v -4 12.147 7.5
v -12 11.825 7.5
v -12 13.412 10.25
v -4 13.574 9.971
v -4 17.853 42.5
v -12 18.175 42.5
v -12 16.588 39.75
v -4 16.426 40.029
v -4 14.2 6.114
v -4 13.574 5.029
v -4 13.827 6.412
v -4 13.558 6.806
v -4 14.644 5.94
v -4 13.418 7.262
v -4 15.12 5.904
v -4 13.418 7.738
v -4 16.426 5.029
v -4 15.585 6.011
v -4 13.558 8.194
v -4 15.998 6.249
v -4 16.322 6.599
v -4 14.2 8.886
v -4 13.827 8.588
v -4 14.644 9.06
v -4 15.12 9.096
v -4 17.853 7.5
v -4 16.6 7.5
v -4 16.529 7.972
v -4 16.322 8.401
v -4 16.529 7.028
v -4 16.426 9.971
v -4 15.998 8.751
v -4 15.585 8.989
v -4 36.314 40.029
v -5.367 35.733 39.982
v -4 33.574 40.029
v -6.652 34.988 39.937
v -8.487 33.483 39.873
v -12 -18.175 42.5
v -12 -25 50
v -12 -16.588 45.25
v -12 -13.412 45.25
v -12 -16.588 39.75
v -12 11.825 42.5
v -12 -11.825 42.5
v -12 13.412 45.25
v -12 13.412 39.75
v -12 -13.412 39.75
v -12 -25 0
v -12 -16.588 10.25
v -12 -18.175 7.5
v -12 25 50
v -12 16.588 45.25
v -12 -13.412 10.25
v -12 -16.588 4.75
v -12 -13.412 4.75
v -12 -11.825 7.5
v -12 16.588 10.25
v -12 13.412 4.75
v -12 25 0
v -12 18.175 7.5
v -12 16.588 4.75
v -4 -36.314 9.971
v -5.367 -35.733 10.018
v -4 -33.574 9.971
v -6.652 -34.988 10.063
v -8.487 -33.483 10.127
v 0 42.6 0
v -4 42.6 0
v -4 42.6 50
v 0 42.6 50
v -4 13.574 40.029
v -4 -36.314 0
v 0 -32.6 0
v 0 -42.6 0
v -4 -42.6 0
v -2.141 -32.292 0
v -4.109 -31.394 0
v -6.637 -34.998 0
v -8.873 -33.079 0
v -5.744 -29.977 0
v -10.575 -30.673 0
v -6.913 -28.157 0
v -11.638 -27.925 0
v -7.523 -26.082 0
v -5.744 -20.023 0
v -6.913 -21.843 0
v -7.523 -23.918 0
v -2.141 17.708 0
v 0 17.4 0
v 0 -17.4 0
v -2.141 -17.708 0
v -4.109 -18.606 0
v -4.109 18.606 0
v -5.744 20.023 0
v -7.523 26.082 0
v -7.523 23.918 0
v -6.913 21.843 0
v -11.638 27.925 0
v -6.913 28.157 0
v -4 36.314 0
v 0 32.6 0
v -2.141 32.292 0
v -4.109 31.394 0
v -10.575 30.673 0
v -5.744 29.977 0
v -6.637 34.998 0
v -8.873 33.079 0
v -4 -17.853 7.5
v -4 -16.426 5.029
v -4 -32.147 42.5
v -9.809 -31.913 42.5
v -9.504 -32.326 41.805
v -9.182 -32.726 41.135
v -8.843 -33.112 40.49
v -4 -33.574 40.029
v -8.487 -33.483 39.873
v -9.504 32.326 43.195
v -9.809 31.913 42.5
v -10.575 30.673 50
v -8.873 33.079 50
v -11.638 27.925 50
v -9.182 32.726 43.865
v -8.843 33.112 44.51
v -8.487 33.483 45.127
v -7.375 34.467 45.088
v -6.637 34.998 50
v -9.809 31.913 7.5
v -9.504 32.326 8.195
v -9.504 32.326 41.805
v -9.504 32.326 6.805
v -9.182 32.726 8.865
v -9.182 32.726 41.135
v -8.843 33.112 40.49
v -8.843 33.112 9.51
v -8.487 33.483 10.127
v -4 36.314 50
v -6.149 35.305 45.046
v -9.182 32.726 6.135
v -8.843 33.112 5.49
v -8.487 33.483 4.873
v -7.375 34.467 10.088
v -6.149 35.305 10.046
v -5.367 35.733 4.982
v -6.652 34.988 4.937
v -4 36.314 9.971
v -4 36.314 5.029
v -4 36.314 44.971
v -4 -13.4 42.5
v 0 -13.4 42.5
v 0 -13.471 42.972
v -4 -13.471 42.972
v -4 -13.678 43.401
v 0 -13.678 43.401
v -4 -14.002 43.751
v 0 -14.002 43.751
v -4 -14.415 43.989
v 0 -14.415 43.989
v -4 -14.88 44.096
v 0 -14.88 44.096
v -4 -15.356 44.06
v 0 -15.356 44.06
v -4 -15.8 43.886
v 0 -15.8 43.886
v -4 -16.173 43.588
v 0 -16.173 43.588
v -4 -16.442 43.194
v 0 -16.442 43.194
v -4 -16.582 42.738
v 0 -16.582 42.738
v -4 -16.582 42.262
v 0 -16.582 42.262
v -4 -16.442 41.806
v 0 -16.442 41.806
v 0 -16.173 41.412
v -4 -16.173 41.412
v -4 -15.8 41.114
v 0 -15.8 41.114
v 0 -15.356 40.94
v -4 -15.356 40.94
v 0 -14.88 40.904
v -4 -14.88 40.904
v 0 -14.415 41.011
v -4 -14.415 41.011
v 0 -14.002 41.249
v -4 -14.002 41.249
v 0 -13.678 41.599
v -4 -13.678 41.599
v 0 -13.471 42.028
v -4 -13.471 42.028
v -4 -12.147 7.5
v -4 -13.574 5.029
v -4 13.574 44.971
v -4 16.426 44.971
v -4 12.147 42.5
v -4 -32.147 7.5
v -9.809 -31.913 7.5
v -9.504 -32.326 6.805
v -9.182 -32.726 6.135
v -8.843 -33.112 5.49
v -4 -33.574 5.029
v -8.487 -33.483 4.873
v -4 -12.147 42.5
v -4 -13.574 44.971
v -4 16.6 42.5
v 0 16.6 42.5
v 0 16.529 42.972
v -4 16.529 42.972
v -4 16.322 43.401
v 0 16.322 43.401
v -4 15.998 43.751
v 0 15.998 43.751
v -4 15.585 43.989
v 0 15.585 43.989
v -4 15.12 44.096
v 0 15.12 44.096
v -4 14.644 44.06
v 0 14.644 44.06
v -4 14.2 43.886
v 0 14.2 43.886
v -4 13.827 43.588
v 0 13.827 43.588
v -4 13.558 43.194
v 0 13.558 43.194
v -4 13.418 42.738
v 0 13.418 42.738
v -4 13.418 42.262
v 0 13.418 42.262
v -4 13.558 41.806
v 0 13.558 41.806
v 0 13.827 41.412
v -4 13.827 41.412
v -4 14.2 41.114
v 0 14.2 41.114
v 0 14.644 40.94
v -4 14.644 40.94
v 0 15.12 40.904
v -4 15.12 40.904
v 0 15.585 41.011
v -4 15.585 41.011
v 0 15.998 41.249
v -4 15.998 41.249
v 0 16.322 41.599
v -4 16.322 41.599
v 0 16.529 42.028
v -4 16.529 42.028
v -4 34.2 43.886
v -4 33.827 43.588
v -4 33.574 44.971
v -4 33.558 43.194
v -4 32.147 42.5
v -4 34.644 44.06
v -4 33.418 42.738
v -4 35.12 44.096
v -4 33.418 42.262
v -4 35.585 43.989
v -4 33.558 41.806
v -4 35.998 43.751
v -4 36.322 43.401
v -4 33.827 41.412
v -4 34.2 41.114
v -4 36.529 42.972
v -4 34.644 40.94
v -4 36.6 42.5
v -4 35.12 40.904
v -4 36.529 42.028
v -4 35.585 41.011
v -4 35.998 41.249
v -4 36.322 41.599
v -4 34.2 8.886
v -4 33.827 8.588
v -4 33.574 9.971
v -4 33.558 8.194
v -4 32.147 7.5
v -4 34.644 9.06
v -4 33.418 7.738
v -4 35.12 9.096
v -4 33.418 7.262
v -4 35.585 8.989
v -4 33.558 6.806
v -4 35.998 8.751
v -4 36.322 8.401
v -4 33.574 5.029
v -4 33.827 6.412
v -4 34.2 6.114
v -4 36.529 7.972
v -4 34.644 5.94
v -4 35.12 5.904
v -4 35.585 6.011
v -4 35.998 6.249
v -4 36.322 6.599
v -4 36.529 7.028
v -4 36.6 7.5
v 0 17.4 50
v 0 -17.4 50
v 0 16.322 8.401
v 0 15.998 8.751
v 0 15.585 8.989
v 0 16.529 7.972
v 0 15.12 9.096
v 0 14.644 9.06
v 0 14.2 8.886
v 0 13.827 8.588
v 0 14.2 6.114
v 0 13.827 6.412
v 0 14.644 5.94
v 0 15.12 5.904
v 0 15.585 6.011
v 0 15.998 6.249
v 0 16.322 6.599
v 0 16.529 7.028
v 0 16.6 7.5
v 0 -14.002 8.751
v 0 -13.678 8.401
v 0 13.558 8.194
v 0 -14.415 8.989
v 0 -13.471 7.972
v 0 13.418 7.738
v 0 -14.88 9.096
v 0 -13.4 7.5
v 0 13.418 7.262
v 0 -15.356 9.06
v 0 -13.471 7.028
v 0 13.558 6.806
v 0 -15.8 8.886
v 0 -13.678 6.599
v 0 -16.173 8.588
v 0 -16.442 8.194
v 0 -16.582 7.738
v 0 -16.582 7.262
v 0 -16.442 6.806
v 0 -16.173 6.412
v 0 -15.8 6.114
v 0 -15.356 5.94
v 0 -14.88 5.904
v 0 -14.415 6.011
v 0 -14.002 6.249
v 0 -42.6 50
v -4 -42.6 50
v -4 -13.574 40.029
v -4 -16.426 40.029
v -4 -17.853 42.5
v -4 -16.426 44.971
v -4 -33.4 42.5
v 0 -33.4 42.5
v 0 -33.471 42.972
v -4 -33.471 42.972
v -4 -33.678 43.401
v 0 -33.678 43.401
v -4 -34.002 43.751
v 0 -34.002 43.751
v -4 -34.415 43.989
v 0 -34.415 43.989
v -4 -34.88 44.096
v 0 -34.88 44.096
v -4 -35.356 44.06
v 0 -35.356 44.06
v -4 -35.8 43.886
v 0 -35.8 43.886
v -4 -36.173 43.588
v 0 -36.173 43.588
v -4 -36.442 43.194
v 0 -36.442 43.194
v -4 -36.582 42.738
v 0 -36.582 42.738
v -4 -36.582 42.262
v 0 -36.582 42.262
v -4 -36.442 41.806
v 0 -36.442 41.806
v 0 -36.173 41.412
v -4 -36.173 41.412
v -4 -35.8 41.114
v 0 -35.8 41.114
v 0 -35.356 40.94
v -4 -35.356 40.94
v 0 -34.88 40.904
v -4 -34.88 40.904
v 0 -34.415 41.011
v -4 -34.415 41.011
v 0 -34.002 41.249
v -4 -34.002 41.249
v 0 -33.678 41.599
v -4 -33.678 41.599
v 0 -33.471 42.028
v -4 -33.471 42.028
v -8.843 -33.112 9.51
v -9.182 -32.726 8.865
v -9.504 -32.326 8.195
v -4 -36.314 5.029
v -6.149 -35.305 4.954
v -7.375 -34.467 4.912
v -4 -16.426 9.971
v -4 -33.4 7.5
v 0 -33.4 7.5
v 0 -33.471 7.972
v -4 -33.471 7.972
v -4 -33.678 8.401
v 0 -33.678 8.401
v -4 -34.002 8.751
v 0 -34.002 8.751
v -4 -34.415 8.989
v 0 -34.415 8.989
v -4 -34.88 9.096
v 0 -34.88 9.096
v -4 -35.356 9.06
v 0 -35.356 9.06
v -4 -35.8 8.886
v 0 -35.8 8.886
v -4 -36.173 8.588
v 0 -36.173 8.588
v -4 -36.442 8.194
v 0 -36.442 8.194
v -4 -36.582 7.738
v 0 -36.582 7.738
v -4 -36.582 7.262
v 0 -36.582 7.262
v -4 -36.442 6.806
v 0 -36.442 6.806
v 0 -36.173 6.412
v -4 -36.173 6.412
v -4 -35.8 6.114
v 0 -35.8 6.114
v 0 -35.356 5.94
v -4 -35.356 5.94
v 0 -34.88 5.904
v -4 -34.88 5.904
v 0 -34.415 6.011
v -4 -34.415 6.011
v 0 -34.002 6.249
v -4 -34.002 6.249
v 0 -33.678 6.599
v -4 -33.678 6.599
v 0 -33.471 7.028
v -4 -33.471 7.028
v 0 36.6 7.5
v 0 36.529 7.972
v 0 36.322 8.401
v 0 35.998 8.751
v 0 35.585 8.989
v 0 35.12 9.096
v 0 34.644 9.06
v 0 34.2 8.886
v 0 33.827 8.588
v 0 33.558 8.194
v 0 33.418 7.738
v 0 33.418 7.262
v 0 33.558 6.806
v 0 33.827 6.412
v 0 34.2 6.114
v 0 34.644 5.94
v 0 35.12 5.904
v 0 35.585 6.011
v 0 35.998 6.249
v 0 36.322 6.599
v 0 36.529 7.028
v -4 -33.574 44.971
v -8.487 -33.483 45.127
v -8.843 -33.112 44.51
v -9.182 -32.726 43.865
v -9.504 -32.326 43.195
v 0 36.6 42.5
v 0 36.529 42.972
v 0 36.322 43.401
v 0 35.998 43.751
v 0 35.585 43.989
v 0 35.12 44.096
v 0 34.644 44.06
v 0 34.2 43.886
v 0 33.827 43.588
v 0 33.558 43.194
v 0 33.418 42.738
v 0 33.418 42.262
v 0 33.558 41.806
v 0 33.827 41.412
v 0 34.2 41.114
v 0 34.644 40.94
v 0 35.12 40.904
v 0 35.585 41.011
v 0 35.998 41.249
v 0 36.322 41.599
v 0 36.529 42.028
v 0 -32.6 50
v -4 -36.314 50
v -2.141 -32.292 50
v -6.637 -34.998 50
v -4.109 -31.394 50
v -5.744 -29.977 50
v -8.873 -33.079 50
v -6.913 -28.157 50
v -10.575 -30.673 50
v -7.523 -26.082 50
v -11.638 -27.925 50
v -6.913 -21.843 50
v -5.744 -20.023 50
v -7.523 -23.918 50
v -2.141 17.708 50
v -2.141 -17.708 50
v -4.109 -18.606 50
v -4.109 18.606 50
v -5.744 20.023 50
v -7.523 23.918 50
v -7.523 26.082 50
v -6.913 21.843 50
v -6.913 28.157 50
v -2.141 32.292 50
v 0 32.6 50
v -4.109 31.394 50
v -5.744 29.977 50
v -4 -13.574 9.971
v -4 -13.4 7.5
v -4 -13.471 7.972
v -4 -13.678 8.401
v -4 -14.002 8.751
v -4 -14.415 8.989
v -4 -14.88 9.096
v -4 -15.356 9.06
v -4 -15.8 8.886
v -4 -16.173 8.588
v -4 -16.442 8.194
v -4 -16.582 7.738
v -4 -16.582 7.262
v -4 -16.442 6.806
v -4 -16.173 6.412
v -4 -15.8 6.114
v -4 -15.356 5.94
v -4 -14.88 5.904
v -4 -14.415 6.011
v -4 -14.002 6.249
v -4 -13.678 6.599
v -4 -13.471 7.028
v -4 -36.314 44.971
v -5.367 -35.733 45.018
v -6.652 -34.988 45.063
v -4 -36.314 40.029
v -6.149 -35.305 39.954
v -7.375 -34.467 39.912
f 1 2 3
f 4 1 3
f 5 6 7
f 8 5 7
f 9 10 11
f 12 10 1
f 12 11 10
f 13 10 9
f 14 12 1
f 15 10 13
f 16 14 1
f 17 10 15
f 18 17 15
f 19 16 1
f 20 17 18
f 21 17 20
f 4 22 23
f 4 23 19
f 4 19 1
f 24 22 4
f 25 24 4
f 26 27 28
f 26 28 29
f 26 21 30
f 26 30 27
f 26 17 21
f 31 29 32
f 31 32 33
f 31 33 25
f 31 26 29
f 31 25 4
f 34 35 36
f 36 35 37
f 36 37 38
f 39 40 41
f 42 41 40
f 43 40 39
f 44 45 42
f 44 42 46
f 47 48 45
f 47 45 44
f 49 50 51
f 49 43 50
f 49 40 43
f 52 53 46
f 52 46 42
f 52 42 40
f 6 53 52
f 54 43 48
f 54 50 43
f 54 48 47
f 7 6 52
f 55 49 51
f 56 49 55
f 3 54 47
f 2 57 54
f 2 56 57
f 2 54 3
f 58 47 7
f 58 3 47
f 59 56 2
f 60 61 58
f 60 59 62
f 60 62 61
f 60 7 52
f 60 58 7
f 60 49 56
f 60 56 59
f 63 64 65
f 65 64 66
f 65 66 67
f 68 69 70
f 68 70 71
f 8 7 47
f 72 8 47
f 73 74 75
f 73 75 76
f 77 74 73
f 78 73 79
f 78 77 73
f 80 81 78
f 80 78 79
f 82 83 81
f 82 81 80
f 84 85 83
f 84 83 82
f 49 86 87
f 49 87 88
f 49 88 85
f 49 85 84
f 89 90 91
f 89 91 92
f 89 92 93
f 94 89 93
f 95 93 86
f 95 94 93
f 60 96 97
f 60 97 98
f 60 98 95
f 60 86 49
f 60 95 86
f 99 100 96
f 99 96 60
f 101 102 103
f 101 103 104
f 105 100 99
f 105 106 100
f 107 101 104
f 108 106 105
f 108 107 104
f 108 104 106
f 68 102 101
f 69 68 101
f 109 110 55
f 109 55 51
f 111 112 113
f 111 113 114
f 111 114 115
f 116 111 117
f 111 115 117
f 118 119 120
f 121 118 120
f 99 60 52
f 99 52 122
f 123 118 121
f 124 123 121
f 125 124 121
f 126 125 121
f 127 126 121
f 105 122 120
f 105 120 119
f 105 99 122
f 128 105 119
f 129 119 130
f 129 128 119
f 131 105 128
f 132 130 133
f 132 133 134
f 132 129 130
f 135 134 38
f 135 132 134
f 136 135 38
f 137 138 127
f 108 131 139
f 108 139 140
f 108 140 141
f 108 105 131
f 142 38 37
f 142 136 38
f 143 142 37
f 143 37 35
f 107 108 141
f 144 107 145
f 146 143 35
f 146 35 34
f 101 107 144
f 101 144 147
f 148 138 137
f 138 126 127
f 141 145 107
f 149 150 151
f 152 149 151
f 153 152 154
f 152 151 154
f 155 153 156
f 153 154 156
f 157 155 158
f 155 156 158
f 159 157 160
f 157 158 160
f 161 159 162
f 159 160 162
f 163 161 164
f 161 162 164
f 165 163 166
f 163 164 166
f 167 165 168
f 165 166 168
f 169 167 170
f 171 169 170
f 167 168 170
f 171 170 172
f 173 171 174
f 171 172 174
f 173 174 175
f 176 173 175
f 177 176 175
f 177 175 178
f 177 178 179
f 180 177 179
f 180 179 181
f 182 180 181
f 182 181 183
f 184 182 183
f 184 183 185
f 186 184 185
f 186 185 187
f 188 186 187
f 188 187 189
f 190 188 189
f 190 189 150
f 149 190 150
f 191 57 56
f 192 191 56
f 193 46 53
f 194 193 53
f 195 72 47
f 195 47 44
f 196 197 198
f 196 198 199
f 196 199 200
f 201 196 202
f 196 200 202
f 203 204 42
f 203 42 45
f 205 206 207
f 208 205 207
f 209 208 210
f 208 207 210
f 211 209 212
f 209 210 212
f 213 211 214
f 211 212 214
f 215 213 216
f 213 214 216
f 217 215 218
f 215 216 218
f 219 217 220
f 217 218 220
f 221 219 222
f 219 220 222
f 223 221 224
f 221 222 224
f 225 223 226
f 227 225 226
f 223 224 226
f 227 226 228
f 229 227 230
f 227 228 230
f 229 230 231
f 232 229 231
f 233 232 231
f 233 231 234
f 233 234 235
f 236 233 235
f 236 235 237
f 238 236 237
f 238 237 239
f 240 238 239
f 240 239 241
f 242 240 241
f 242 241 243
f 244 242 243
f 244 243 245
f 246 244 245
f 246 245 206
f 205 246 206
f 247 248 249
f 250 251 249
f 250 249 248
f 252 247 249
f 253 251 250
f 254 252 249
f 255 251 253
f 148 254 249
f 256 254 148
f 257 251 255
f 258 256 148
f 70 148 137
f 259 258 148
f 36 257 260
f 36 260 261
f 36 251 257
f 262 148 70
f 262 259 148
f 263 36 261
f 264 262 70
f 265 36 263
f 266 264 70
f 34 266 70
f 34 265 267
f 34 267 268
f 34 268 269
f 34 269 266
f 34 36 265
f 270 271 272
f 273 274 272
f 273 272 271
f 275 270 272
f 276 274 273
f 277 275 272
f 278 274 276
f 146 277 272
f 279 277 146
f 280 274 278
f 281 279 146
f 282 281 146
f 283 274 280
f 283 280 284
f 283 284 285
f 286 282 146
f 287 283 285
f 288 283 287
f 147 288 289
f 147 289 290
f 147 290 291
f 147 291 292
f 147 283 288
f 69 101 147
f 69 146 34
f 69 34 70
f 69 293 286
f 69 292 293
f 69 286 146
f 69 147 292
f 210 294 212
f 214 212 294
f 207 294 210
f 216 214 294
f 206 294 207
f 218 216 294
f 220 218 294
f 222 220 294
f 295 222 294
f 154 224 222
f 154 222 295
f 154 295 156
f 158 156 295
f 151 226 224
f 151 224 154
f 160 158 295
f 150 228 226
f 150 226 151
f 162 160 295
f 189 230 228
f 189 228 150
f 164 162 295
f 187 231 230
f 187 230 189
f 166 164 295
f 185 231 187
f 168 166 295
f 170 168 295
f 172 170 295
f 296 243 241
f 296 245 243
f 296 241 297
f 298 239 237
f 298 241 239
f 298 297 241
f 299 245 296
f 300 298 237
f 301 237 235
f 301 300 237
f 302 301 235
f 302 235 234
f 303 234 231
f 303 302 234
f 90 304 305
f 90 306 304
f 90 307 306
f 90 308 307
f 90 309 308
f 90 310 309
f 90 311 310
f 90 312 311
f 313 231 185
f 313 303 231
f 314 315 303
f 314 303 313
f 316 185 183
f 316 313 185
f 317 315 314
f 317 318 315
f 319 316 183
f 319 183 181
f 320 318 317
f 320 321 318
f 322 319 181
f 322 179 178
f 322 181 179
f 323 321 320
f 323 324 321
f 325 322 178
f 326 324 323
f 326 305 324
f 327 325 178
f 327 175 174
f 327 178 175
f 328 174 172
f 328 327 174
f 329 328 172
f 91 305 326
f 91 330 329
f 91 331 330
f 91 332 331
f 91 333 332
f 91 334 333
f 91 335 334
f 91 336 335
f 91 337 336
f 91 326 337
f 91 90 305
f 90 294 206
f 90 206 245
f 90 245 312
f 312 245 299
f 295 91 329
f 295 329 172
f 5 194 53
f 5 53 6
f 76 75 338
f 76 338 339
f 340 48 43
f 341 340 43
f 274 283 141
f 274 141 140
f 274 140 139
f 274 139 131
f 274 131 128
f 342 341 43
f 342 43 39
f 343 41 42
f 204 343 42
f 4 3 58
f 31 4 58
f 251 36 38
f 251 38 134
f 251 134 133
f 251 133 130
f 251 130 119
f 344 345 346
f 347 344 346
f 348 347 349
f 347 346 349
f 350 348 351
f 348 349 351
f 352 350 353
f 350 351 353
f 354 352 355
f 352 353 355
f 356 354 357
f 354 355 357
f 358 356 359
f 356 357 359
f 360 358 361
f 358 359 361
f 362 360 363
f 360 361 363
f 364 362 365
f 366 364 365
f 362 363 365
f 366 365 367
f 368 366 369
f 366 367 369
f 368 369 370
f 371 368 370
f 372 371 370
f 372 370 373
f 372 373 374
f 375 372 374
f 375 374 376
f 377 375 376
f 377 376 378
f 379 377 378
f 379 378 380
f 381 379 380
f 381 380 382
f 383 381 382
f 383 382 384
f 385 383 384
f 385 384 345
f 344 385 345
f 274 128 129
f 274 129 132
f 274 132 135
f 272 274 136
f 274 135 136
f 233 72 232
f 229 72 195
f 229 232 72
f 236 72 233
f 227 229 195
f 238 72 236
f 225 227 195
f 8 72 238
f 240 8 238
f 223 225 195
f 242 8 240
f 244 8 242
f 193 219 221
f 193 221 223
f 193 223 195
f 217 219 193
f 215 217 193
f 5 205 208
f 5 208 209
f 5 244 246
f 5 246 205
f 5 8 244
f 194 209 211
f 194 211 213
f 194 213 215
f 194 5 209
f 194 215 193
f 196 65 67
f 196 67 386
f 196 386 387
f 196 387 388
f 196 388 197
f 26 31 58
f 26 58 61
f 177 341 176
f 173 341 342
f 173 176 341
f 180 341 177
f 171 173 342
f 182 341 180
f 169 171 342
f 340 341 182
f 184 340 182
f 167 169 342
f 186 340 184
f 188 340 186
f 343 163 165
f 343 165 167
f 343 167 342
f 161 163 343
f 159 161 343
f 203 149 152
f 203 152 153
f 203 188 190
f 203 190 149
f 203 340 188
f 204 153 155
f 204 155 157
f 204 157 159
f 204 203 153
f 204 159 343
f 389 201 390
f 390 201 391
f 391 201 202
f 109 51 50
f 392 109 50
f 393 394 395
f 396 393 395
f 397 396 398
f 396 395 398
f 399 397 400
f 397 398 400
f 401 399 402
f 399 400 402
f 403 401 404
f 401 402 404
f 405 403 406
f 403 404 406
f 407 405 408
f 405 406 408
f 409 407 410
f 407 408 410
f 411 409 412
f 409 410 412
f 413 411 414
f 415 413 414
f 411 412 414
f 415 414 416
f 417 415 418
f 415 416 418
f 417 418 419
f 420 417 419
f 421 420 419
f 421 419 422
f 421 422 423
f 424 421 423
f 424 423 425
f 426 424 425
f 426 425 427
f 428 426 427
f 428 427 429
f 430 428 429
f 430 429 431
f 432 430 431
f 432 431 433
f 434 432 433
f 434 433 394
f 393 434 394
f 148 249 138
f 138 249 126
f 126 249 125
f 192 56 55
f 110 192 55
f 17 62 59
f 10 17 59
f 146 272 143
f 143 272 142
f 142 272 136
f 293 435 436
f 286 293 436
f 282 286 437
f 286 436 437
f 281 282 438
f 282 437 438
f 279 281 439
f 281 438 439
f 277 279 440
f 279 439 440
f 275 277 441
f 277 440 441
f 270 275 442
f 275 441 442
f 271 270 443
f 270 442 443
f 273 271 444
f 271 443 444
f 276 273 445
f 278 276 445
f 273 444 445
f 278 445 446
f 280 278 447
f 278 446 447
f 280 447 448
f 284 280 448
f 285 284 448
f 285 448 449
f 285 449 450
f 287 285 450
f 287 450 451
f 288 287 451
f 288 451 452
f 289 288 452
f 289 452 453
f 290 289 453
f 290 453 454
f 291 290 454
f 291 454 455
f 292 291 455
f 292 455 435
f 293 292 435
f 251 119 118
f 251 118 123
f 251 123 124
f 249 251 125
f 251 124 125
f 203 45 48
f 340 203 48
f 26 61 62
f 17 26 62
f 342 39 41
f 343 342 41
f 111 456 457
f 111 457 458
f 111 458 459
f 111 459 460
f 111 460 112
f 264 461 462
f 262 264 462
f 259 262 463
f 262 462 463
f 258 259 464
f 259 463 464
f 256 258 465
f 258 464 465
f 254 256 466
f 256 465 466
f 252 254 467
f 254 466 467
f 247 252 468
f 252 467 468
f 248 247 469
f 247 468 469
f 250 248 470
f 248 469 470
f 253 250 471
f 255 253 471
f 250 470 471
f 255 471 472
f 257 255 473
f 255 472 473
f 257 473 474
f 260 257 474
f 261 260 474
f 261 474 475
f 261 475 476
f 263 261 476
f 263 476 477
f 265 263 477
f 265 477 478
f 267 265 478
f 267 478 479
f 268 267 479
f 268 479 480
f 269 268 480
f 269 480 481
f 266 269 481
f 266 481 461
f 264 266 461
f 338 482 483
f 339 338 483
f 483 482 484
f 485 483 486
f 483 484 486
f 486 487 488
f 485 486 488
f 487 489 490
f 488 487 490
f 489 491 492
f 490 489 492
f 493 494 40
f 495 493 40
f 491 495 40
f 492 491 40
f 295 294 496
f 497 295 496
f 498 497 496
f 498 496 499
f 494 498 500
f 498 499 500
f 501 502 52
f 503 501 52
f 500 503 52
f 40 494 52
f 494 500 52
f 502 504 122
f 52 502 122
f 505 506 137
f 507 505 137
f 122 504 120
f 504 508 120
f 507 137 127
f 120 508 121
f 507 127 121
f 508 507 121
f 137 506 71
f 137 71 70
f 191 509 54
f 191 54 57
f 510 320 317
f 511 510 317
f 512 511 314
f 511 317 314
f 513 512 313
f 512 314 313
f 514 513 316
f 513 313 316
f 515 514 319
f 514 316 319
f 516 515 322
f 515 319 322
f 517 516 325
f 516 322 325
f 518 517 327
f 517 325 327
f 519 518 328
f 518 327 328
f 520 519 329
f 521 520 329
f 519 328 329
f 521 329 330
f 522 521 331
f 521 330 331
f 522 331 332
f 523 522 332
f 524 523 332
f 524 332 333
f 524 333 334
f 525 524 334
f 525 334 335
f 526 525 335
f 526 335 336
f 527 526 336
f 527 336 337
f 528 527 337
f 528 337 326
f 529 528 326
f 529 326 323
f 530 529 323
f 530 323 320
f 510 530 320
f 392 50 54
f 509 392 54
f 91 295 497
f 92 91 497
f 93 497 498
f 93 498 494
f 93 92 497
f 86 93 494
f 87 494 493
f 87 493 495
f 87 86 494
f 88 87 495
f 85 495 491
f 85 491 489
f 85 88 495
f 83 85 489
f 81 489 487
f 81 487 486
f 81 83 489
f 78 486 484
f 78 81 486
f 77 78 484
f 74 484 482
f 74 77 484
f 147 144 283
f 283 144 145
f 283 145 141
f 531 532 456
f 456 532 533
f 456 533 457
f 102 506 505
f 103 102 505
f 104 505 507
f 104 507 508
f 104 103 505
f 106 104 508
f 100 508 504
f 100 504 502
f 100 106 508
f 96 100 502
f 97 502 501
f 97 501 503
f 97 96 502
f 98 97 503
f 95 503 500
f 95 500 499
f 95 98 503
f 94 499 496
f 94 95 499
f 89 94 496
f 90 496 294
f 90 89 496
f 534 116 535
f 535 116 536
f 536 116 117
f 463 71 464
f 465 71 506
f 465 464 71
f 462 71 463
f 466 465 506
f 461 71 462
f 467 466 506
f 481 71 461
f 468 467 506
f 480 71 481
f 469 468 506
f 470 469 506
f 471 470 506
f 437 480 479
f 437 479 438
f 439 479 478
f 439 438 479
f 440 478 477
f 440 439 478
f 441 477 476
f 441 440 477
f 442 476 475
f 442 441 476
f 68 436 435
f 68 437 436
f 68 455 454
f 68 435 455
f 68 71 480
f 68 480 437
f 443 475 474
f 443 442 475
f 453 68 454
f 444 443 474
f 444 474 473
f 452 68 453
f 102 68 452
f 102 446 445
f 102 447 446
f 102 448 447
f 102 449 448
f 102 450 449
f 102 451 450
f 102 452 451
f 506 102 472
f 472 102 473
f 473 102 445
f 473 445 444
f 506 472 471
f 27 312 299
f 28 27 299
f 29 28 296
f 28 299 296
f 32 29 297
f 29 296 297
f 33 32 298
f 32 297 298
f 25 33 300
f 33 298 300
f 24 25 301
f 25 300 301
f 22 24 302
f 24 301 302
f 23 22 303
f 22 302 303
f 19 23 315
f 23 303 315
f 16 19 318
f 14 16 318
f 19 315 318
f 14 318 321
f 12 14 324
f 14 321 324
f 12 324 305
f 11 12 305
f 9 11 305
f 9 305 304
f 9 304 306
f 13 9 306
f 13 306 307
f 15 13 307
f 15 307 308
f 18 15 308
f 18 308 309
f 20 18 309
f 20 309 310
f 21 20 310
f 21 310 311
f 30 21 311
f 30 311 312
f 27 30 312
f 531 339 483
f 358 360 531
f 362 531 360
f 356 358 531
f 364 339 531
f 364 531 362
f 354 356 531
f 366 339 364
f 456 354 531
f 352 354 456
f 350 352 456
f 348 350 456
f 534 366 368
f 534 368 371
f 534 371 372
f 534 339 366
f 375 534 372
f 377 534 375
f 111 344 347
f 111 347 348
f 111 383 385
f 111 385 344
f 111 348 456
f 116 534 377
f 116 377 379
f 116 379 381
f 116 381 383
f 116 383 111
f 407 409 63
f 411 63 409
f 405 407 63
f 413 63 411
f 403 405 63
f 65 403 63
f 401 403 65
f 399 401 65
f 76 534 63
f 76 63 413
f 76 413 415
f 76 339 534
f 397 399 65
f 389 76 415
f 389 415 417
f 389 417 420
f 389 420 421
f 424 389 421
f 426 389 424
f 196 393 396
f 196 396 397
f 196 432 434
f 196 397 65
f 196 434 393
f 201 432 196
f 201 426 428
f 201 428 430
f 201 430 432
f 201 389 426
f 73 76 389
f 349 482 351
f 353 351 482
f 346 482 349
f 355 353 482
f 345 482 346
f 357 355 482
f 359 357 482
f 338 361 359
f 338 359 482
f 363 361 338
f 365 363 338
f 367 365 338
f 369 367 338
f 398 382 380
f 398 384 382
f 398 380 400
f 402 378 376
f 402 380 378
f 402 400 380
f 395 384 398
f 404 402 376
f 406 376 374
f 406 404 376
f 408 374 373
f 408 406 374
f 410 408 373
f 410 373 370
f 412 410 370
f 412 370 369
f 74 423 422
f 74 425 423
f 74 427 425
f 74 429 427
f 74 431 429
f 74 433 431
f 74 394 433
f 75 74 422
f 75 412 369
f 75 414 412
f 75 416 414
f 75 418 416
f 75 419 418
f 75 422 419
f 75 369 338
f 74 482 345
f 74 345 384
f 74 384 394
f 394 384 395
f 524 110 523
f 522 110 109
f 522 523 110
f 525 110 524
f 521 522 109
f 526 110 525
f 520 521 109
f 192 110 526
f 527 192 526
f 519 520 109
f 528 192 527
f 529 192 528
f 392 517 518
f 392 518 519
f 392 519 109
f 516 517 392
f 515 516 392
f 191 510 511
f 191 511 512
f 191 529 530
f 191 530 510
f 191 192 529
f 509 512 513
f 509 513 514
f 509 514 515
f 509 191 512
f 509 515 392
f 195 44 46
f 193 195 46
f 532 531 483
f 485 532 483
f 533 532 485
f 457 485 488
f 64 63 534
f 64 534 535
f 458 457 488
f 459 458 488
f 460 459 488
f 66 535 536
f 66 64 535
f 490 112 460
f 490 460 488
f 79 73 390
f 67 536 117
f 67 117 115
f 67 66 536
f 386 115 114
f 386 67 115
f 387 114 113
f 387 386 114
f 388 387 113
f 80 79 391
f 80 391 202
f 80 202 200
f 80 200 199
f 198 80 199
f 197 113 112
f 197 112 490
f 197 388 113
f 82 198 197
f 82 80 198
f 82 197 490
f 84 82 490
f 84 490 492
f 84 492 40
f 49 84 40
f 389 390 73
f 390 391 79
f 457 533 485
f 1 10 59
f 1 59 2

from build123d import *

# Parameters (mm, degrees)
RESSALTO_EXTRUS_O1_DEPTH        = 50
ESBO_O2_R                       = 1.6
CORTE_EXTRUS_O1_DEPTH           = 67.773947015
CORTE_EXTRUS_O2_DEPTH           = 8
CORTE_EXTRUS_O2_DRAFT           = -2
CORTE_EXTRUS_O2_PROFILE_2_DEPTH = 8
CORTE_EXTRUS_O2_PROFILE_2_DRAFT = -2
CORTE_EXTRUS_O2_PROFILE_3_DEPTH = 8
CORTE_EXTRUS_O2_PROFILE_3_DRAFT = -2
CORTE_EXTRUS_O2_PROFILE_4_DEPTH = 8
CORTE_EXTRUS_O2_PROFILE_4_DRAFT = -2
CORTE_EXTRUS_O2_PROFILE_5_DEPTH = 8
CORTE_EXTRUS_O2_PROFILE_5_DRAFT = -2
CORTE_EXTRUS_O2_PROFILE_6_DEPTH = 8
CORTE_EXTRUS_O2_PROFILE_6_DRAFT = -2
CORTE_EXTRUS_O2_PROFILE_7_DEPTH = 8
CORTE_EXTRUS_O2_PROFILE_7_DRAFT = -2
CORTE_EXTRUS_O2_PROFILE_8_DEPTH = 8
CORTE_EXTRUS_O2_PROFILE_8_DRAFT = -2


with BuildPart() as part:
    # Esboço1 → Ressalto-extrusão1 (new body)
    with BuildSketch(Plane.XY):
        with BuildLine():
            Line((0, 17.4), (0, -17.4))
            ThreePointArc((0, -17.4), (-7.6, -25), (0, -32.6))
            Line((0, -32.6), (0, -42.6))
            Line((0, -42.6), (-4, -42.6))
            Line((-4, -42.6), (-4, -36.313708499))
            ThreePointArc((-4, -36.313708499), (-9.797958971, -31.92820323), (-12, -25))
            Line((-12, -25), (-12, 25))
            ThreePointArc((-12, 25), (-9.797958971, 31.92820323), (-4, 36.313708499))
            Line((-4, 36.313708499), (-4, 42.6))
            Line((-4, 42.6), (0, 42.6))
            Line((0, 42.6), (0, 32.6))
            ThreePointArc((0, 32.6), (-7.6, 25), (0, 17.4))
        make_face()
    extrude(amount=RESSALTO_EXTRUS_O1_DEPTH)

    # Esboço2 → Corte-extrusão1 (cut, through all)
    with BuildSketch(Plane(origin=(0, 0, 0), x_dir=(0, 0, -1), z_dir=(1, 0, 0))):
        with Locations(Location((-42.5, 35, 0), (0, 0, 90))):
            Circle(ESBO_O2_R)
        with Locations(Location((-7.5, 35, 0), (0, 0, 90))):
            Circle(ESBO_O2_R)
        with Locations(Location((-7.5, -35, 0), (0, 0, 90))):
            Circle(ESBO_O2_R)
        with Locations(Location((-42.5, -35, 0), (0, 0, 90))):
            Circle(ESBO_O2_R)
        with Locations(Location((-42.5, -15, 0), (0, 0, 90))):
            Circle(ESBO_O2_R)
        with Locations(Location((-42.5, 15, 0), (0, 0, 90))):
            Circle(ESBO_O2_R)
        with Locations(Location((-7.5, 15, 0), (0, 0, 90))):
            Circle(ESBO_O2_R)
        with Locations(Location((-7.5, -15, 0), (0, 0, 90))):
            Circle(ESBO_O2_R)
    extrude(amount=-CORTE_EXTRUS_O1_DEPTH, mode=Mode.SUBTRACT)


with BuildPart() as corte_extrus_o2_tool:
    # Esboço3 → Corte-extrusão2 (with draft: the straight prism first)
    with BuildSketch(Plane.ZY.offset(12)):
        Polygon((10.25, 36.58771324), (7.5, 38.175426481), (4.75, 36.58771324), (4.75, 33.41228676), (7.5, 31.824573519), (10.25, 33.41228676), align=None)
    extrude(amount=-CORTE_EXTRUS_O2_DEPTH)
    # Corte-extrusão2: the draft: its side faces are tilted about the plane it starts from
    corte_extrus_o2_sides = [corte_extrus_o2_tool.faces().sort_by_distance(p)[0] for p in [
        (-8, 37.38156986, 8.875),
        (-8, 37.38156986, 6.125),
        (-8, 35, 4.75),
        (-8, 32.61843014, 6.125),
        (-8, 32.61843014, 8.875),
        (-8, 35, 10.25),
    ]]
    draft(corte_extrus_o2_sides, Plane.ZY.offset(12), CORTE_EXTRUS_O2_DRAFT)


with BuildPart() as part_1:
    add(part.part)

    # Corte-extrusão2: cut by corte_extrus_o2_tool
    add(corte_extrus_o2_tool.part, mode=Mode.SUBTRACT)


with BuildPart() as corte_extrus_o2_profile_2_tool:
    # Esboço3 → Corte-extrusão2 profile 2 (with draft: the straight prism first)
    with BuildSketch(Plane.ZY.offset(12)):
        Polygon((45.25, 36.58771324), (42.5, 38.175426481), (39.75, 36.58771324), (39.75, 33.41228676), (42.5, 31.824573519), (45.25, 33.41228676), align=None)
    extrude(amount=-CORTE_EXTRUS_O2_PROFILE_2_DEPTH)
    # Corte-extrusão2 profile 2: the draft: its side faces are tilted about the plane it starts from
    corte_extrus_o2_profile_2_sides = [corte_extrus_o2_profile_2_tool.faces().sort_by_distance(p)[0] for p in [
        (-8, 37.38156986, 43.875),
        (-8, 37.38156986, 41.125),
        (-8, 35, 39.75),
        (-8, 32.61843014, 41.125),
        (-8, 32.61843014, 43.875),
        (-8, 35, 45.25),
    ]]
    draft(corte_extrus_o2_profile_2_sides, Plane.ZY.offset(12), CORTE_EXTRUS_O2_PROFILE_2_DRAFT)


with BuildPart() as part_2:
    add(part_1.part)

    # Corte-extrusão2 profile 2: cut by corte_extrus_o2_profile_2_tool
    add(corte_extrus_o2_profile_2_tool.part, mode=Mode.SUBTRACT)


with BuildPart() as corte_extrus_o2_profile_3_tool:
    # Esboço3 → Corte-extrusão2 profile 3 (with draft: the straight prism first)
    with BuildSketch(Plane.ZY.offset(12)):
        Polygon((45.25, 16.58771324), (42.5, 18.175426481), (39.75, 16.58771324), (39.75, 13.41228676), (42.5, 11.824573519), (45.25, 13.41228676), align=None)
    extrude(amount=-CORTE_EXTRUS_O2_PROFILE_3_DEPTH)
    # Corte-extrusão2 profile 3: the draft: its side faces are tilted about the plane it starts from
    corte_extrus_o2_profile_3_sides = [corte_extrus_o2_profile_3_tool.faces().sort_by_distance(p)[0] for p in [
        (-8, 17.38156986, 43.875),
        (-8, 17.38156986, 41.125),
        (-8, 15, 39.75),
        (-8, 12.61843014, 41.125),
        (-8, 12.61843014, 43.875),
        (-8, 15, 45.25),
    ]]
    draft(corte_extrus_o2_profile_3_sides, Plane.ZY.offset(12), CORTE_EXTRUS_O2_PROFILE_3_DRAFT)


with BuildPart() as part_3:
    add(part_2.part)

    # Corte-extrusão2 profile 3: cut by corte_extrus_o2_profile_3_tool
    add(corte_extrus_o2_profile_3_tool.part, mode=Mode.SUBTRACT)


with BuildPart() as corte_extrus_o2_profile_4_tool:
    # Esboço3 → Corte-extrusão2 profile 4 (with draft: the straight prism first)
    with BuildSketch(Plane.ZY.offset(12)):
        Polygon((10.25, 16.58771324), (7.5, 18.175426481), (4.75, 16.58771324), (4.75, 13.41228676), (7.5, 11.824573519), (10.25, 13.41228676), align=None)
    extrude(amount=-CORTE_EXTRUS_O2_PROFILE_4_DEPTH)
    # Corte-extrusão2 profile 4: the draft: its side faces are tilted about the plane it starts from
    corte_extrus_o2_profile_4_sides = [corte_extrus_o2_profile_4_tool.faces().sort_by_distance(p)[0] for p in [
        (-8, 17.38156986, 8.875),
        (-8, 17.38156986, 6.125),
        (-8, 15, 4.75),
        (-8, 12.61843014, 6.125),
        (-8, 12.61843014, 8.875),
        (-8, 15, 10.25),
    ]]
    draft(corte_extrus_o2_profile_4_sides, Plane.ZY.offset(12), CORTE_EXTRUS_O2_PROFILE_4_DRAFT)


with BuildPart() as part_4:
    add(part_3.part)

    # Corte-extrusão2 profile 4: cut by corte_extrus_o2_profile_4_tool
    add(corte_extrus_o2_profile_4_tool.part, mode=Mode.SUBTRACT)


with BuildPart() as corte_extrus_o2_profile_5_tool:
    # Esboço3 → Corte-extrusão2 profile 5 (with draft: the straight prism first)
    with BuildSketch(Plane.ZY.offset(12)):
        Polygon((10.25, -13.41228676), (7.5, -11.824573519), (4.75, -13.41228676), (4.75, -16.58771324), (7.5, -18.175426481), (10.25, -16.58771324), align=None)
    extrude(amount=-CORTE_EXTRUS_O2_PROFILE_5_DEPTH)
    # Corte-extrusão2 profile 5: the draft: its side faces are tilted about the plane it starts from
    corte_extrus_o2_profile_5_sides = [corte_extrus_o2_profile_5_tool.faces().sort_by_distance(p)[0] for p in [
        (-8, -12.61843014, 8.875),
        (-8, -12.61843014, 6.125),
        (-8, -15, 4.75),
        (-8, -17.38156986, 6.125),
        (-8, -17.38156986, 8.875),
        (-8, -15, 10.25),
    ]]
    draft(corte_extrus_o2_profile_5_sides, Plane.ZY.offset(12), CORTE_EXTRUS_O2_PROFILE_5_DRAFT)


with BuildPart() as part_5:
    add(part_4.part)

    # Corte-extrusão2 profile 5: cut by corte_extrus_o2_profile_5_tool
    add(corte_extrus_o2_profile_5_tool.part, mode=Mode.SUBTRACT)


with BuildPart() as corte_extrus_o2_profile_6_tool:
    # Esboço3 → Corte-extrusão2 profile 6 (with draft: the straight prism first)
    with BuildSketch(Plane.ZY.offset(12)):
        Polygon((10.25, -33.41228676), (7.5, -31.824573519), (4.75, -33.41228676), (4.75, -36.58771324), (7.5, -38.175426481), (10.25, -36.58771324), align=None)
    extrude(amount=-CORTE_EXTRUS_O2_PROFILE_6_DEPTH)
    # Corte-extrusão2 profile 6: the draft: its side faces are tilted about the plane it starts from
    corte_extrus_o2_profile_6_sides = [corte_extrus_o2_profile_6_tool.faces().sort_by_distance(p)[0] for p in [
        (-8, -32.61843014, 8.875),
        (-8, -32.61843014, 6.125),
        (-8, -35, 4.75),
        (-8, -37.38156986, 6.125),
        (-8, -37.38156986, 8.875),
        (-8, -35, 10.25),
    ]]
    draft(corte_extrus_o2_profile_6_sides, Plane.ZY.offset(12), CORTE_EXTRUS_O2_PROFILE_6_DRAFT)


with BuildPart() as part_6:
    add(part_5.part)

    # Corte-extrusão2 profile 6: cut by corte_extrus_o2_profile_6_tool
    add(corte_extrus_o2_profile_6_tool.part, mode=Mode.SUBTRACT)


with BuildPart() as corte_extrus_o2_profile_7_tool:
    # Esboço3 → Corte-extrusão2 profile 7 (with draft: the straight prism first)
    with BuildSketch(Plane.ZY.offset(12)):
        Polygon((45.25, -33.41228676), (42.5, -31.824573519), (39.75, -33.41228676), (39.75, -36.58771324), (42.5, -38.175426481), (45.25, -36.58771324), align=None)
    extrude(amount=-CORTE_EXTRUS_O2_PROFILE_7_DEPTH)
    # Corte-extrusão2 profile 7: the draft: its side faces are tilted about the plane it starts from
    corte_extrus_o2_profile_7_sides = [corte_extrus_o2_profile_7_tool.faces().sort_by_distance(p)[0] for p in [
        (-8, -32.61843014, 43.875),
        (-8, -32.61843014, 41.125),
        (-8, -35, 39.75),
        (-8, -37.38156986, 41.125),
        (-8, -37.38156986, 43.875),
        (-8, -35, 45.25),
    ]]
    draft(corte_extrus_o2_profile_7_sides, Plane.ZY.offset(12), CORTE_EXTRUS_O2_PROFILE_7_DRAFT)


with BuildPart() as part_7:
    add(part_6.part)

    # Corte-extrusão2 profile 7: cut by corte_extrus_o2_profile_7_tool
    add(corte_extrus_o2_profile_7_tool.part, mode=Mode.SUBTRACT)


with BuildPart() as corte_extrus_o2_profile_8_tool:
    # Esboço3 → Corte-extrusão2 profile 8 (with draft: the straight prism first)
    with BuildSketch(Plane.ZY.offset(12)):
        Polygon((45.25, -13.41228676), (42.5, -11.824573519), (39.75, -13.41228676), (39.75, -16.58771324), (42.5, -18.175426481), (45.25, -16.58771324), align=None)
    extrude(amount=-CORTE_EXTRUS_O2_PROFILE_8_DEPTH)
    # Corte-extrusão2 profile 8: the draft: its side faces are tilted about the plane it starts from
    corte_extrus_o2_profile_8_sides = [corte_extrus_o2_profile_8_tool.faces().sort_by_distance(p)[0] for p in [
        (-8, -12.61843014, 43.875),
        (-8, -12.61843014, 41.125),
        (-8, -15, 39.75),
        (-8, -17.38156986, 41.125),
        (-8, -17.38156986, 43.875),
        (-8, -15, 45.25),
    ]]
    draft(corte_extrus_o2_profile_8_sides, Plane.ZY.offset(12), CORTE_EXTRUS_O2_PROFILE_8_DRAFT)


with BuildPart() as part_8:
    add(part_7.part)

    # Corte-extrusão2 profile 8: cut by corte_extrus_o2_profile_8_tool
    add(corte_extrus_o2_profile_8_tool.part, mode=Mode.SUBTRACT)


solid = part_8.part
